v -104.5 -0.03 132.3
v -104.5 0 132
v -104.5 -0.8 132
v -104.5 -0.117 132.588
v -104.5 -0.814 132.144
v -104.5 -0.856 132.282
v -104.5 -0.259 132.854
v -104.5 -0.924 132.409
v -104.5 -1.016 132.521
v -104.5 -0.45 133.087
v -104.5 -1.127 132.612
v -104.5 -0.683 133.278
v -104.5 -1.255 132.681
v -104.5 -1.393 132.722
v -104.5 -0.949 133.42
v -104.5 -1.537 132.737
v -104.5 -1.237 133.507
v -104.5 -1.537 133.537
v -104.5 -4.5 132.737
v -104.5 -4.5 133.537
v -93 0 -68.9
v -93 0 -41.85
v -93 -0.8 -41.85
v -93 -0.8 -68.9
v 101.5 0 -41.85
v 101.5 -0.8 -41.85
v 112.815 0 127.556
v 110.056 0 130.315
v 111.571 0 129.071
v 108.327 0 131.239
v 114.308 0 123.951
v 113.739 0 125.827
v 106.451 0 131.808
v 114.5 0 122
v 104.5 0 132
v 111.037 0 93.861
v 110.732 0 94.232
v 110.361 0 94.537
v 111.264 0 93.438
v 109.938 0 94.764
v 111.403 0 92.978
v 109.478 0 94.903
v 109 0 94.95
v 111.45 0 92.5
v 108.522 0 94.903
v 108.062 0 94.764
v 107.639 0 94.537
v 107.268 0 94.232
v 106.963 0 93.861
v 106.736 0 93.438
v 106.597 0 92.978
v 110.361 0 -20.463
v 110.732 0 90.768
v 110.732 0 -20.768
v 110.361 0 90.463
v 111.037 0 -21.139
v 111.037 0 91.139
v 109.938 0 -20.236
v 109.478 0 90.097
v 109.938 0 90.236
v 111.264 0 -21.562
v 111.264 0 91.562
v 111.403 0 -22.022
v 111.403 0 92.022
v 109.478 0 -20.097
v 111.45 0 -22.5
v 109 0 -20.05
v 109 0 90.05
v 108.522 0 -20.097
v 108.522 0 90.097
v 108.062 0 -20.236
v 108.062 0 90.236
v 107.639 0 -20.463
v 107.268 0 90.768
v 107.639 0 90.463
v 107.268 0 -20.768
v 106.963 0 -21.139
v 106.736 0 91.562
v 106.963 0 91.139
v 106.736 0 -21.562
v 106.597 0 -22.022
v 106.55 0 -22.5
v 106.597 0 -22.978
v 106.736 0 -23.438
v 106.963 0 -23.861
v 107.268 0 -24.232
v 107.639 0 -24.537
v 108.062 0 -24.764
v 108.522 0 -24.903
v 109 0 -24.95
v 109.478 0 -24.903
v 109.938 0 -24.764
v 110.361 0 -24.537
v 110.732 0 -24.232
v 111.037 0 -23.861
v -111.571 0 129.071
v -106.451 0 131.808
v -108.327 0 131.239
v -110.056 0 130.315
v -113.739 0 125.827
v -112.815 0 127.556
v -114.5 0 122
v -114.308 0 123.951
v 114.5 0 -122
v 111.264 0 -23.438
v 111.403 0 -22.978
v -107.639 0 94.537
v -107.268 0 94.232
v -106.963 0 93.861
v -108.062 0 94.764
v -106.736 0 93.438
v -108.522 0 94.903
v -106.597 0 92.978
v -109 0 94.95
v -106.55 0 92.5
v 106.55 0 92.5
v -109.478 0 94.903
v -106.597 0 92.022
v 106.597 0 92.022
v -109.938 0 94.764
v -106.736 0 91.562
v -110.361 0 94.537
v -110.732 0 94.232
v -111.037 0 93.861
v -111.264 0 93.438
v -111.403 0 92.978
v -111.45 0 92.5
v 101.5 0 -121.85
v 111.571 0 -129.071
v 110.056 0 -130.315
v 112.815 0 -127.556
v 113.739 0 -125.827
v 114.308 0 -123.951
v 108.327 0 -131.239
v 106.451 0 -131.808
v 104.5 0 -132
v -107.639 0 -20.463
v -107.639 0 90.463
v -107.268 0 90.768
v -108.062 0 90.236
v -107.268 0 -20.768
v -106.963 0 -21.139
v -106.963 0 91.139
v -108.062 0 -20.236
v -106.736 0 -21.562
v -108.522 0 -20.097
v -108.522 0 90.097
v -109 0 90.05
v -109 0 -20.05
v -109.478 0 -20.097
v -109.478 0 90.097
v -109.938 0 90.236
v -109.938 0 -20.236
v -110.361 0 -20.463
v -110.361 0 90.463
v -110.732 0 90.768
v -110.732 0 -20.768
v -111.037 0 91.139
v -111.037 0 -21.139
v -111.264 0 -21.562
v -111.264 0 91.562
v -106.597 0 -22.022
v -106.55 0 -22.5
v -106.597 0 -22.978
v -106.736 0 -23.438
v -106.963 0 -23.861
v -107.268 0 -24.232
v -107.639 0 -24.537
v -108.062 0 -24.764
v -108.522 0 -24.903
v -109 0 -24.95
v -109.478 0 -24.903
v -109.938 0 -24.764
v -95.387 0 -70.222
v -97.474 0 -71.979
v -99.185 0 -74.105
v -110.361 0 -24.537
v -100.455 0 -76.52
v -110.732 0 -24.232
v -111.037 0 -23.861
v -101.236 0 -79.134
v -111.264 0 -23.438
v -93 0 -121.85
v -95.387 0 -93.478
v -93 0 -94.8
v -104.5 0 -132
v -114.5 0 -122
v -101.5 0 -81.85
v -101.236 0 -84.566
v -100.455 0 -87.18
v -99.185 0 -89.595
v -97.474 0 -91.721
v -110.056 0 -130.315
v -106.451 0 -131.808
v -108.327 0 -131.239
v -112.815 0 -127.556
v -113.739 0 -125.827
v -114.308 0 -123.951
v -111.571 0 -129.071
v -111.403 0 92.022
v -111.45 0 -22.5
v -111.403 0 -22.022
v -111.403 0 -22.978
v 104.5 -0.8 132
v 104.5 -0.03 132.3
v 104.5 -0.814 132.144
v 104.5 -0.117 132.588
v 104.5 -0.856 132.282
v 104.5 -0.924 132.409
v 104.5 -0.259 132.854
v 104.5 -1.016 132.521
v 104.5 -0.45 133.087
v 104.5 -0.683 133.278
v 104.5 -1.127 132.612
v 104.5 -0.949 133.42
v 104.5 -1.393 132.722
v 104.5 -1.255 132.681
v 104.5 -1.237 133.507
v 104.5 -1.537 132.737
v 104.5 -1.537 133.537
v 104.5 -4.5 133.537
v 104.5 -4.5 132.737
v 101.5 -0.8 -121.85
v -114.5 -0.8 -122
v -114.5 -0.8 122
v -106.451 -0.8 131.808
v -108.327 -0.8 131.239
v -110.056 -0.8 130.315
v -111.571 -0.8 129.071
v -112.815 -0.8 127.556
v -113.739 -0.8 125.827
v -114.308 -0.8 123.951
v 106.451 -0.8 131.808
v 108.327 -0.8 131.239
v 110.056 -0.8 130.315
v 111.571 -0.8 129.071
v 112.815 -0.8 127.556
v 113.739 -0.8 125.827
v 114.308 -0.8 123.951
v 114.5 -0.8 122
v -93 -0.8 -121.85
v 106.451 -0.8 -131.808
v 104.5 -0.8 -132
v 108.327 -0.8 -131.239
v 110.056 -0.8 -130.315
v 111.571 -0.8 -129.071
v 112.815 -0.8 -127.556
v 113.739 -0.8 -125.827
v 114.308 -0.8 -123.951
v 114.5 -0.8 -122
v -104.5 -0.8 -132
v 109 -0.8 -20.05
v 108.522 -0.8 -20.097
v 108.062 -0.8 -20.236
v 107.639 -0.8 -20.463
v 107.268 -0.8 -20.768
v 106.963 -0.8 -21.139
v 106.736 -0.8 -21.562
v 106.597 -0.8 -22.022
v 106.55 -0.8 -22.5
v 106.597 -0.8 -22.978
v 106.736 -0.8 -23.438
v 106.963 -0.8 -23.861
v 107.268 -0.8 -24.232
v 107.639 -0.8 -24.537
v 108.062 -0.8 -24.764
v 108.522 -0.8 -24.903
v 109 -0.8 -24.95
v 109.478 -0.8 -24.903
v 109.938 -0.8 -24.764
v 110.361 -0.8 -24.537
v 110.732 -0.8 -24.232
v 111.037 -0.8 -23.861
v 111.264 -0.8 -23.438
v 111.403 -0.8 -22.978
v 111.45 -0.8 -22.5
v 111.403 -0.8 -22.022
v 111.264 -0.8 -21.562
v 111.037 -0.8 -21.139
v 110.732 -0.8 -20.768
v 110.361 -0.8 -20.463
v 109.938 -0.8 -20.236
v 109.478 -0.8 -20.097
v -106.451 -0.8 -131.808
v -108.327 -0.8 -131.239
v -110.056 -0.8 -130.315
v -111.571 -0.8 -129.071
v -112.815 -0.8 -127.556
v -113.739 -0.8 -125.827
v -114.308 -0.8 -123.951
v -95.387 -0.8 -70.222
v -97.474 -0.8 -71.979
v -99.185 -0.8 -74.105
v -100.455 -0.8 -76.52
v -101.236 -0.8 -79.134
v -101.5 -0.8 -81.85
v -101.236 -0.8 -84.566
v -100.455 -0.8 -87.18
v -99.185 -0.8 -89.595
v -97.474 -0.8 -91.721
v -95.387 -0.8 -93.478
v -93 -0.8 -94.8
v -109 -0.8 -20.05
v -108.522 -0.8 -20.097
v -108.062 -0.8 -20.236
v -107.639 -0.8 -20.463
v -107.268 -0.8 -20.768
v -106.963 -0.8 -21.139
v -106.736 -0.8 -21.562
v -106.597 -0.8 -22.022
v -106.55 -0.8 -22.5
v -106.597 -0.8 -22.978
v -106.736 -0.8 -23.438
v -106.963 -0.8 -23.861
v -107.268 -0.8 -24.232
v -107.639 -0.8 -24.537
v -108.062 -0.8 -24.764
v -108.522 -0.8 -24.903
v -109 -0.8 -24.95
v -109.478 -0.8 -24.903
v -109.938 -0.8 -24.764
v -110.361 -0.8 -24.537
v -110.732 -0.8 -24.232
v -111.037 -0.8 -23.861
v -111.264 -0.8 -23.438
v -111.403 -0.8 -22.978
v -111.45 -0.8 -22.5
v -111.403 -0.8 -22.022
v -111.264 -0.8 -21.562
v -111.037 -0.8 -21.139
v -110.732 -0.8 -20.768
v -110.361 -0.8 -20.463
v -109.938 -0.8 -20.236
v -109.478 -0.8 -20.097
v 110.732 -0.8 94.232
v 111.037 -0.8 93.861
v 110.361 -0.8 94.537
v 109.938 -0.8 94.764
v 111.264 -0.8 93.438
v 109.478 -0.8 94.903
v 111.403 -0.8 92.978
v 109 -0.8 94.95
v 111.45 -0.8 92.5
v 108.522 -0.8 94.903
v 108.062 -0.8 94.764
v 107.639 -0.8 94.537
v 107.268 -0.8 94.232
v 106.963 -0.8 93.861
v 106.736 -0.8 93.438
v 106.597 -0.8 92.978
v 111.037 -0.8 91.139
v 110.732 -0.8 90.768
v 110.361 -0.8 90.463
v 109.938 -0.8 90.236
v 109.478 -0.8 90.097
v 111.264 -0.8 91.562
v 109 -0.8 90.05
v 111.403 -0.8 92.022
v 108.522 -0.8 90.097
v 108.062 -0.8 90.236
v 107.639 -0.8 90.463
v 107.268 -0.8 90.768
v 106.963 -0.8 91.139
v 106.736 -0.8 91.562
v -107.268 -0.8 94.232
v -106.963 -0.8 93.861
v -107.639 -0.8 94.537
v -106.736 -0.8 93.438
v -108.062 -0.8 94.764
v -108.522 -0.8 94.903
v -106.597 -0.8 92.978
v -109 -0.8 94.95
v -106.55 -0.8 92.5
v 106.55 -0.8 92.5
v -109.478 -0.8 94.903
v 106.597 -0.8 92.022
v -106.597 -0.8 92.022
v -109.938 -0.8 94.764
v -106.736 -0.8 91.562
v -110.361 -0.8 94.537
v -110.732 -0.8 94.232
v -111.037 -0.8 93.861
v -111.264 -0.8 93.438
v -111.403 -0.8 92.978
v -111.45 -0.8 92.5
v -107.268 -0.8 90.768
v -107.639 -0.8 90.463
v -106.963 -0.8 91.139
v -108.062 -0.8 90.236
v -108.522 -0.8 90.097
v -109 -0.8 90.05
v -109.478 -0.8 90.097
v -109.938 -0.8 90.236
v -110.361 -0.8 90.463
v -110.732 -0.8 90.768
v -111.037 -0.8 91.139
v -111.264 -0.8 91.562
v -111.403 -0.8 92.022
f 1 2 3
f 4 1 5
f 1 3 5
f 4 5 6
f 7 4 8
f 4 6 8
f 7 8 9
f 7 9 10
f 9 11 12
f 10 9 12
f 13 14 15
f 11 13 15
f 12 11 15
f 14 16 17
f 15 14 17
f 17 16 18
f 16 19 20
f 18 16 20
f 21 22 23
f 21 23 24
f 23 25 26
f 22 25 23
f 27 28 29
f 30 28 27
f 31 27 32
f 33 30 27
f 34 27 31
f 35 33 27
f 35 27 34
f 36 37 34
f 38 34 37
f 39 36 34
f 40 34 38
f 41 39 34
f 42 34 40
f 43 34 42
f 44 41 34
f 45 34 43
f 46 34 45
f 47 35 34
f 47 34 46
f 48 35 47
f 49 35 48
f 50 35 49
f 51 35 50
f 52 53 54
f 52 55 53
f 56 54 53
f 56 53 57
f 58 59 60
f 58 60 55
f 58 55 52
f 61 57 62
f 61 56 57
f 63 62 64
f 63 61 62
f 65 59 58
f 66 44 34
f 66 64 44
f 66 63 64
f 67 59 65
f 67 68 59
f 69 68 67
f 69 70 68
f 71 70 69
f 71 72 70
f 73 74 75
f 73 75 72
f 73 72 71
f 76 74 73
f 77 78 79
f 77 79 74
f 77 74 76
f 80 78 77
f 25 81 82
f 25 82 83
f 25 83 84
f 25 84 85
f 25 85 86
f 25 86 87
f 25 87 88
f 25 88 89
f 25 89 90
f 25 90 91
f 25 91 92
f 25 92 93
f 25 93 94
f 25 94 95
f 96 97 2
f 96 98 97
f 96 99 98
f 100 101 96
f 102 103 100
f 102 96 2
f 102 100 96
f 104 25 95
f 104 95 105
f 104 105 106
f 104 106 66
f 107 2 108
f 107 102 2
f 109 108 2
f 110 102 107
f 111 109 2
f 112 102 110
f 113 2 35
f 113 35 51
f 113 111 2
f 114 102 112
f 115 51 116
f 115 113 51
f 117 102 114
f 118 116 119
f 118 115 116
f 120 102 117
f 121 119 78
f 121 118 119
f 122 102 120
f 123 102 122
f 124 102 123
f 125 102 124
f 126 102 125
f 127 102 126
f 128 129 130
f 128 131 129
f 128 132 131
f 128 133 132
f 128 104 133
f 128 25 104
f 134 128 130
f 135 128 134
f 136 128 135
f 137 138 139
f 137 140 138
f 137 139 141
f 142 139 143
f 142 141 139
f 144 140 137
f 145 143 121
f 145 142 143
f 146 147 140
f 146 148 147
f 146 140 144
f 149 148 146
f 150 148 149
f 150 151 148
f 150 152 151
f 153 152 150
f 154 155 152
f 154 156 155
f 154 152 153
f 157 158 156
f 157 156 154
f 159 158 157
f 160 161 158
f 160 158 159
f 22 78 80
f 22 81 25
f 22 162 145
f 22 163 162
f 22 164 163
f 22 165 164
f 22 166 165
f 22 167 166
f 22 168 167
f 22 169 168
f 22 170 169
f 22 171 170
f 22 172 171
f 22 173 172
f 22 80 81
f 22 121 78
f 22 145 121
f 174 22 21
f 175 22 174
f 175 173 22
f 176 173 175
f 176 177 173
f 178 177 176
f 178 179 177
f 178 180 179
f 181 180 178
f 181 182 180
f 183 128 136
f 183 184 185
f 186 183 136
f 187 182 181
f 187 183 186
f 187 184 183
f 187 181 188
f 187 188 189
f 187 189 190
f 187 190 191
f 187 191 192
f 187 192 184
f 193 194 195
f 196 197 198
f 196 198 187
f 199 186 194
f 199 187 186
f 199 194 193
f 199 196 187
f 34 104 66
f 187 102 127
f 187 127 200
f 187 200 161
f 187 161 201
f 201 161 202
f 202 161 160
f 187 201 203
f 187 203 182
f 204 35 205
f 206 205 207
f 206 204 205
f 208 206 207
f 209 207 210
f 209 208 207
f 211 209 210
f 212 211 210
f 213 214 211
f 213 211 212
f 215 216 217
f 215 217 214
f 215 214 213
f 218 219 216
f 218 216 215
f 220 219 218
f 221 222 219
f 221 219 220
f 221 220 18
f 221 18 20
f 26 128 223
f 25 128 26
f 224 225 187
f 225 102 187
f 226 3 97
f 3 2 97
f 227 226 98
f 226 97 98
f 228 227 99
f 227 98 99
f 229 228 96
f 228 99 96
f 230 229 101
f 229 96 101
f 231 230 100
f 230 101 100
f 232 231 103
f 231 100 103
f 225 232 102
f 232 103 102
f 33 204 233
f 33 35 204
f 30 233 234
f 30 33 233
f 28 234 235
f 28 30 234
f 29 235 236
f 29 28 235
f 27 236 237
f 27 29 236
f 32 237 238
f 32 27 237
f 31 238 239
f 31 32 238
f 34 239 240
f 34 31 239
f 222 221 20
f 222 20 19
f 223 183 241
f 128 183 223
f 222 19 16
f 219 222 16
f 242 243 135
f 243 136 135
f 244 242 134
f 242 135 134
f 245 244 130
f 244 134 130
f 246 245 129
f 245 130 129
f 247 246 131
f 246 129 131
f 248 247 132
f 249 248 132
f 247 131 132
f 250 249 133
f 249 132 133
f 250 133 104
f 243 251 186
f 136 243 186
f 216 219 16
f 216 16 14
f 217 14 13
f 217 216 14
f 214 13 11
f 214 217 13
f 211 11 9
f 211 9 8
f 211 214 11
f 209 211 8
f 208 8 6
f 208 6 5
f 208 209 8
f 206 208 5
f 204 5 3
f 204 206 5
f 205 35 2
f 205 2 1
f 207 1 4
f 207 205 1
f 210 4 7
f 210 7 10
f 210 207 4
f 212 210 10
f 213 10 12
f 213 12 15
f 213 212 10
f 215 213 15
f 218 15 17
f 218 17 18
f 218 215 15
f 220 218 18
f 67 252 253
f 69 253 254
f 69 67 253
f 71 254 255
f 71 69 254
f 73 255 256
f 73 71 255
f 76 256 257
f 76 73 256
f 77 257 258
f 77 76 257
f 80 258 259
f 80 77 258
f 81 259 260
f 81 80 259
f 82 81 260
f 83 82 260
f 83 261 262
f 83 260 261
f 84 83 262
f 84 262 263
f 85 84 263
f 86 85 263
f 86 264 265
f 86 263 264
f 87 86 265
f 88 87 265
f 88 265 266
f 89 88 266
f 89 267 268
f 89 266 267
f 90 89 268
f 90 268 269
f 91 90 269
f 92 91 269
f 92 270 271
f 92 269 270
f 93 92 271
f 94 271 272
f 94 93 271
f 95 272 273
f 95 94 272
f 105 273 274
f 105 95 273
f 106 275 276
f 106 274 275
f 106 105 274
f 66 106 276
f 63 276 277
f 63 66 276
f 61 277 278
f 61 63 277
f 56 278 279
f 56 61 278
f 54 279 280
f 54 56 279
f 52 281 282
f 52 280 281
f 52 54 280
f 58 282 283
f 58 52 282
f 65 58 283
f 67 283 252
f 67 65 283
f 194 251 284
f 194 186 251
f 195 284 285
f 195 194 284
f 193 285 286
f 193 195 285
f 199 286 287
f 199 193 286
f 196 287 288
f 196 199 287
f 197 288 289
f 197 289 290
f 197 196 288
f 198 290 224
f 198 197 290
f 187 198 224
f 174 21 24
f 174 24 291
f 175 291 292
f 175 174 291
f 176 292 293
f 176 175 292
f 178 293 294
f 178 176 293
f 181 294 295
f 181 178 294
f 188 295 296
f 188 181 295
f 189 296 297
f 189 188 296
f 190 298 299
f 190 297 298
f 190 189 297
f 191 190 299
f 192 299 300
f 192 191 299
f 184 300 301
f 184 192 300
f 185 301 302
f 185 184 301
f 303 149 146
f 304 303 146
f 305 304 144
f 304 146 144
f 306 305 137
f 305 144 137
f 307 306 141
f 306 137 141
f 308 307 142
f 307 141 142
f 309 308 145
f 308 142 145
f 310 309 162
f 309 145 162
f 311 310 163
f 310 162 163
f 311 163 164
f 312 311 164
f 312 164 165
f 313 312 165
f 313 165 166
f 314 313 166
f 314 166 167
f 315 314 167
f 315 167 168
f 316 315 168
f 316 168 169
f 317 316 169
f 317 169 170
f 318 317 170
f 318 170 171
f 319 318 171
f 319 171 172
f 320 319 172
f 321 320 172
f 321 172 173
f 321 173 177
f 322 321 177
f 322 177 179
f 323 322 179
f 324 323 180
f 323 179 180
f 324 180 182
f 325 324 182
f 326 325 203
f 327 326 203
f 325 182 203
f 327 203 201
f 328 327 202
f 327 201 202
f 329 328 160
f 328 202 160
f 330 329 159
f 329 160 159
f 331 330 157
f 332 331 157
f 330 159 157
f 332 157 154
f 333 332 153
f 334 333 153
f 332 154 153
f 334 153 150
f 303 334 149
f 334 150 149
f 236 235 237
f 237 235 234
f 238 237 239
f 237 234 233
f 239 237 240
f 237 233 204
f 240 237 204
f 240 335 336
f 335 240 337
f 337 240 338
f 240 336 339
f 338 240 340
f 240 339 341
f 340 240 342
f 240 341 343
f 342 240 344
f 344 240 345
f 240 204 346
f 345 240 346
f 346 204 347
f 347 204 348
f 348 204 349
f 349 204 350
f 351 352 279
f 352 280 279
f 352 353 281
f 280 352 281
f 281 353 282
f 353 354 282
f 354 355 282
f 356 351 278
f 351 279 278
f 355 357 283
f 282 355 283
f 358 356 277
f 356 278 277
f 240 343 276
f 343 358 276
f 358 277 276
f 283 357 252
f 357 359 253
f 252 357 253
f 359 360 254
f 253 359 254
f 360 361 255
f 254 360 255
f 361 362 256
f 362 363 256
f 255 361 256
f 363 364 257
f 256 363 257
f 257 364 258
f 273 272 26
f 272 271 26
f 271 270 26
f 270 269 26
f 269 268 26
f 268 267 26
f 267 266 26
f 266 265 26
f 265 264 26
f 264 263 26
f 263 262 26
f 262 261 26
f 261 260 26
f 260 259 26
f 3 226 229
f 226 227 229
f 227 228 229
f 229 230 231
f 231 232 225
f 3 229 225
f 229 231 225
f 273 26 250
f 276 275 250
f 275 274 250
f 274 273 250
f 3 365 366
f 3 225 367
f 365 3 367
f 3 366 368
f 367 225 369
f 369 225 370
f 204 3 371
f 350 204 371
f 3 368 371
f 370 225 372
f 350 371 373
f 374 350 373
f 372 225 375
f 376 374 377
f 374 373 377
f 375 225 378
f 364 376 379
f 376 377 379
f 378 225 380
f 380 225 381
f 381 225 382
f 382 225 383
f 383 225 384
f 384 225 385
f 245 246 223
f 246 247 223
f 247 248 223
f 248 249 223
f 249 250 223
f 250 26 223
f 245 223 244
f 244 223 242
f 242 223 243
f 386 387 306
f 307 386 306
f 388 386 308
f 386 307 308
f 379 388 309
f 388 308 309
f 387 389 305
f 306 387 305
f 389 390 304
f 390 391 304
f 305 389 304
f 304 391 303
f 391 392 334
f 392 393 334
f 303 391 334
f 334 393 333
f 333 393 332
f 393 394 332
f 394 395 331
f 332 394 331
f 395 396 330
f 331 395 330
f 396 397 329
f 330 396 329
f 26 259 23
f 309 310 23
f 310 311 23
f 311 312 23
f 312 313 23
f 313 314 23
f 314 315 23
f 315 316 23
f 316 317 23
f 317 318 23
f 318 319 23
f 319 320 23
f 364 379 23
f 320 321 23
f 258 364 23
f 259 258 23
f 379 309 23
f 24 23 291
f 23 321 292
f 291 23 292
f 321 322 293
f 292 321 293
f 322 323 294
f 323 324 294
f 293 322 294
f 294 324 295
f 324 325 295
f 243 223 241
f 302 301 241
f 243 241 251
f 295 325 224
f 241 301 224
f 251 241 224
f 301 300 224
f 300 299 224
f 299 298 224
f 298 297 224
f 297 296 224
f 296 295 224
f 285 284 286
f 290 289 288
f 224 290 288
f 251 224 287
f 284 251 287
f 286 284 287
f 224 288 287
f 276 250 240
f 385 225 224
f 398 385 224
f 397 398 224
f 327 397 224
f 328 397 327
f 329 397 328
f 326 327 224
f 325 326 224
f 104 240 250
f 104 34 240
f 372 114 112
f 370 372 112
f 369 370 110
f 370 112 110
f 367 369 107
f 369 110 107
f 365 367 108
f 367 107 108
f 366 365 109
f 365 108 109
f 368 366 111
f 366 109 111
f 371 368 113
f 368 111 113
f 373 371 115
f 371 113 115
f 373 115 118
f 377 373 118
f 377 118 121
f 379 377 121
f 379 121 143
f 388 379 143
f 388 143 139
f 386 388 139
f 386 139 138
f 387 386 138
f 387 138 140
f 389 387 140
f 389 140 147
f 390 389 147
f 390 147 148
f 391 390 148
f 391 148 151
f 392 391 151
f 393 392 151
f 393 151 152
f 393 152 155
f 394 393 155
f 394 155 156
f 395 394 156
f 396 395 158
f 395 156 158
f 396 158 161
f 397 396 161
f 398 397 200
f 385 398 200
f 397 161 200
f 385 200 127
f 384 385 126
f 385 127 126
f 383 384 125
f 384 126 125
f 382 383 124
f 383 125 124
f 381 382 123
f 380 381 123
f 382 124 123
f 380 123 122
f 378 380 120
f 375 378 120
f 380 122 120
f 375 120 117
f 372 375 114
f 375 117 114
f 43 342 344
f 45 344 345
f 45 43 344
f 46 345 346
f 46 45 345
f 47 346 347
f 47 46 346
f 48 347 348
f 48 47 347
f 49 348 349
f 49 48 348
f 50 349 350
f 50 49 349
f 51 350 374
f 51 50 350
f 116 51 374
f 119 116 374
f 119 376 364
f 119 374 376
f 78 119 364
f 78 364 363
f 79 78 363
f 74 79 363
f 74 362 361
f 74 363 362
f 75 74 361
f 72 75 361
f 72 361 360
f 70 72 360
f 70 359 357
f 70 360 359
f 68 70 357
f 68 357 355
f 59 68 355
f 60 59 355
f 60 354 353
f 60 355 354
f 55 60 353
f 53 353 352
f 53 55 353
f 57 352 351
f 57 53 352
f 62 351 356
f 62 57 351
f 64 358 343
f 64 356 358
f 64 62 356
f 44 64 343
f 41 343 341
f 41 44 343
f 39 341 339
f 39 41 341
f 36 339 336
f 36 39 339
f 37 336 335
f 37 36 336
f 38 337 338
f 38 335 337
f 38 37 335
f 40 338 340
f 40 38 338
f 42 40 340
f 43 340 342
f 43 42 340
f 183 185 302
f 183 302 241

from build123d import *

# Parameters (mm, degrees)
BASE_FLANGE1_DEPTH      = 114.5
BASE_FLANGE1_DEPTH_BACK = 114.5
SKETCH1_W               = 264
SKETCH1_H               = 0.8
FILLET1_R               = 10
EDGE_FLANGE2_DEPTH      = 209
SKETCH14_R              = 2.45
CUT_EXTRUDE1_DEPTH      = 176.961710436
CUT_EXTRUDE2_DEPTH      = 176.961710436


# Sheet-metal steps are written as plain solids
with BuildPart() as part:
    # Sketch1 → Base-Flange1 (new, two sides: drawn at the far end of the back side and taken through both)
    with BuildSketch(Plane(origin=(0, 0, 0), x_dir=(0, 0, -1), z_dir=(1, 0, 0)).offset(-BASE_FLANGE1_DEPTH_BACK)):
        with Locations((0, -0.4)):
            Rectangle(SKETCH1_W, SKETCH1_H)
    extrude(amount=BASE_FLANGE1_DEPTH + BASE_FLANGE1_DEPTH_BACK)

    # Fillet1
    fillet1_edges = [part.edges().sort_by_distance(p)[0] for p in [
        (-114.5, -0.4, 132),
        (-114.5, -0.4, -132),
        (114.5, -0.4, 132),
        (114.5, -0.4, -132),
    ]]
    fillet(fillet1_edges, radius=FILLET1_R)

    # Edge-Flange2 section (across the edge) → Edge-Flange2 (add)
    with BuildSketch(Plane(origin=(104.5, -0.8, 132.7366), x_dir=(0, 0, -1), z_dir=(-1, 0, 0))):
        with BuildLine():
            Line((-0.8, 0.7366), (-0.8, 3.7))
            Line((-0.8, 3.7), (0, 3.7))
            Line((0, 3.7), (0, 0.7366))
            ThreePointArc((0, 0.7366), (0.215745145, 0.215745145), (0.7366, 0))
            Line((0.7366, 0), (0.7366, -0.8))
            ThreePointArc((0.7366, -0.8), (-0.34994028, -0.34994028), (-0.8, 0.7366))
        make_face()
    extrude(amount=EDGE_FLANGE2_DEPTH)

    # Sketch14 → Cut-Extrude1 (cut, through all)
    with BuildSketch(Plane(origin=(0, 0, 0), x_dir=(1, 0, 0), z_dir=(0, 1, 0))):
        with Locations(Location((-109, -92.5, 0), (0, 0, 270))):
            Circle(SKETCH14_R)
        with Locations(Location((-109, 22.5, 0), (0, 0, 270))):
            Circle(SKETCH14_R)
    cut_extrude1 = extrude(amount=-CUT_EXTRUDE1_DEPTH, mode=Mode.SUBTRACT)

    # Mirror1: Cut-Extrude1 across plane
    add(cut_extrude1.mirror(Plane(origin=(0, 0, 0), x_dir=(0, 0, 1), z_dir=(1, 0, 0))), mode=Mode.SUBTRACT)

    # Sketch15 → Cut-Extrude2 (cut, through all)
    with BuildSketch(Plane(origin=(0, 0, 0), x_dir=(1, 0, 0), z_dir=(0, 1, 0))):
        with BuildLine():
            Line((-93, 121.85), (101.5, 121.85))
            Line((101.5, 121.85), (101.5, 41.85))
            Line((101.5, 41.85), (-93, 41.85))
            Line((-93, 41.85), (-93, 68.9))
            ThreePointArc((-93, 68.9), (-101.5, 81.85), (-93, 94.8))
            Line((-93, 94.8), (-93, 121.85))
        make_face()
    extrude(amount=-CUT_EXTRUDE2_DEPTH, mode=Mode.SUBTRACT)


solid = part.part
